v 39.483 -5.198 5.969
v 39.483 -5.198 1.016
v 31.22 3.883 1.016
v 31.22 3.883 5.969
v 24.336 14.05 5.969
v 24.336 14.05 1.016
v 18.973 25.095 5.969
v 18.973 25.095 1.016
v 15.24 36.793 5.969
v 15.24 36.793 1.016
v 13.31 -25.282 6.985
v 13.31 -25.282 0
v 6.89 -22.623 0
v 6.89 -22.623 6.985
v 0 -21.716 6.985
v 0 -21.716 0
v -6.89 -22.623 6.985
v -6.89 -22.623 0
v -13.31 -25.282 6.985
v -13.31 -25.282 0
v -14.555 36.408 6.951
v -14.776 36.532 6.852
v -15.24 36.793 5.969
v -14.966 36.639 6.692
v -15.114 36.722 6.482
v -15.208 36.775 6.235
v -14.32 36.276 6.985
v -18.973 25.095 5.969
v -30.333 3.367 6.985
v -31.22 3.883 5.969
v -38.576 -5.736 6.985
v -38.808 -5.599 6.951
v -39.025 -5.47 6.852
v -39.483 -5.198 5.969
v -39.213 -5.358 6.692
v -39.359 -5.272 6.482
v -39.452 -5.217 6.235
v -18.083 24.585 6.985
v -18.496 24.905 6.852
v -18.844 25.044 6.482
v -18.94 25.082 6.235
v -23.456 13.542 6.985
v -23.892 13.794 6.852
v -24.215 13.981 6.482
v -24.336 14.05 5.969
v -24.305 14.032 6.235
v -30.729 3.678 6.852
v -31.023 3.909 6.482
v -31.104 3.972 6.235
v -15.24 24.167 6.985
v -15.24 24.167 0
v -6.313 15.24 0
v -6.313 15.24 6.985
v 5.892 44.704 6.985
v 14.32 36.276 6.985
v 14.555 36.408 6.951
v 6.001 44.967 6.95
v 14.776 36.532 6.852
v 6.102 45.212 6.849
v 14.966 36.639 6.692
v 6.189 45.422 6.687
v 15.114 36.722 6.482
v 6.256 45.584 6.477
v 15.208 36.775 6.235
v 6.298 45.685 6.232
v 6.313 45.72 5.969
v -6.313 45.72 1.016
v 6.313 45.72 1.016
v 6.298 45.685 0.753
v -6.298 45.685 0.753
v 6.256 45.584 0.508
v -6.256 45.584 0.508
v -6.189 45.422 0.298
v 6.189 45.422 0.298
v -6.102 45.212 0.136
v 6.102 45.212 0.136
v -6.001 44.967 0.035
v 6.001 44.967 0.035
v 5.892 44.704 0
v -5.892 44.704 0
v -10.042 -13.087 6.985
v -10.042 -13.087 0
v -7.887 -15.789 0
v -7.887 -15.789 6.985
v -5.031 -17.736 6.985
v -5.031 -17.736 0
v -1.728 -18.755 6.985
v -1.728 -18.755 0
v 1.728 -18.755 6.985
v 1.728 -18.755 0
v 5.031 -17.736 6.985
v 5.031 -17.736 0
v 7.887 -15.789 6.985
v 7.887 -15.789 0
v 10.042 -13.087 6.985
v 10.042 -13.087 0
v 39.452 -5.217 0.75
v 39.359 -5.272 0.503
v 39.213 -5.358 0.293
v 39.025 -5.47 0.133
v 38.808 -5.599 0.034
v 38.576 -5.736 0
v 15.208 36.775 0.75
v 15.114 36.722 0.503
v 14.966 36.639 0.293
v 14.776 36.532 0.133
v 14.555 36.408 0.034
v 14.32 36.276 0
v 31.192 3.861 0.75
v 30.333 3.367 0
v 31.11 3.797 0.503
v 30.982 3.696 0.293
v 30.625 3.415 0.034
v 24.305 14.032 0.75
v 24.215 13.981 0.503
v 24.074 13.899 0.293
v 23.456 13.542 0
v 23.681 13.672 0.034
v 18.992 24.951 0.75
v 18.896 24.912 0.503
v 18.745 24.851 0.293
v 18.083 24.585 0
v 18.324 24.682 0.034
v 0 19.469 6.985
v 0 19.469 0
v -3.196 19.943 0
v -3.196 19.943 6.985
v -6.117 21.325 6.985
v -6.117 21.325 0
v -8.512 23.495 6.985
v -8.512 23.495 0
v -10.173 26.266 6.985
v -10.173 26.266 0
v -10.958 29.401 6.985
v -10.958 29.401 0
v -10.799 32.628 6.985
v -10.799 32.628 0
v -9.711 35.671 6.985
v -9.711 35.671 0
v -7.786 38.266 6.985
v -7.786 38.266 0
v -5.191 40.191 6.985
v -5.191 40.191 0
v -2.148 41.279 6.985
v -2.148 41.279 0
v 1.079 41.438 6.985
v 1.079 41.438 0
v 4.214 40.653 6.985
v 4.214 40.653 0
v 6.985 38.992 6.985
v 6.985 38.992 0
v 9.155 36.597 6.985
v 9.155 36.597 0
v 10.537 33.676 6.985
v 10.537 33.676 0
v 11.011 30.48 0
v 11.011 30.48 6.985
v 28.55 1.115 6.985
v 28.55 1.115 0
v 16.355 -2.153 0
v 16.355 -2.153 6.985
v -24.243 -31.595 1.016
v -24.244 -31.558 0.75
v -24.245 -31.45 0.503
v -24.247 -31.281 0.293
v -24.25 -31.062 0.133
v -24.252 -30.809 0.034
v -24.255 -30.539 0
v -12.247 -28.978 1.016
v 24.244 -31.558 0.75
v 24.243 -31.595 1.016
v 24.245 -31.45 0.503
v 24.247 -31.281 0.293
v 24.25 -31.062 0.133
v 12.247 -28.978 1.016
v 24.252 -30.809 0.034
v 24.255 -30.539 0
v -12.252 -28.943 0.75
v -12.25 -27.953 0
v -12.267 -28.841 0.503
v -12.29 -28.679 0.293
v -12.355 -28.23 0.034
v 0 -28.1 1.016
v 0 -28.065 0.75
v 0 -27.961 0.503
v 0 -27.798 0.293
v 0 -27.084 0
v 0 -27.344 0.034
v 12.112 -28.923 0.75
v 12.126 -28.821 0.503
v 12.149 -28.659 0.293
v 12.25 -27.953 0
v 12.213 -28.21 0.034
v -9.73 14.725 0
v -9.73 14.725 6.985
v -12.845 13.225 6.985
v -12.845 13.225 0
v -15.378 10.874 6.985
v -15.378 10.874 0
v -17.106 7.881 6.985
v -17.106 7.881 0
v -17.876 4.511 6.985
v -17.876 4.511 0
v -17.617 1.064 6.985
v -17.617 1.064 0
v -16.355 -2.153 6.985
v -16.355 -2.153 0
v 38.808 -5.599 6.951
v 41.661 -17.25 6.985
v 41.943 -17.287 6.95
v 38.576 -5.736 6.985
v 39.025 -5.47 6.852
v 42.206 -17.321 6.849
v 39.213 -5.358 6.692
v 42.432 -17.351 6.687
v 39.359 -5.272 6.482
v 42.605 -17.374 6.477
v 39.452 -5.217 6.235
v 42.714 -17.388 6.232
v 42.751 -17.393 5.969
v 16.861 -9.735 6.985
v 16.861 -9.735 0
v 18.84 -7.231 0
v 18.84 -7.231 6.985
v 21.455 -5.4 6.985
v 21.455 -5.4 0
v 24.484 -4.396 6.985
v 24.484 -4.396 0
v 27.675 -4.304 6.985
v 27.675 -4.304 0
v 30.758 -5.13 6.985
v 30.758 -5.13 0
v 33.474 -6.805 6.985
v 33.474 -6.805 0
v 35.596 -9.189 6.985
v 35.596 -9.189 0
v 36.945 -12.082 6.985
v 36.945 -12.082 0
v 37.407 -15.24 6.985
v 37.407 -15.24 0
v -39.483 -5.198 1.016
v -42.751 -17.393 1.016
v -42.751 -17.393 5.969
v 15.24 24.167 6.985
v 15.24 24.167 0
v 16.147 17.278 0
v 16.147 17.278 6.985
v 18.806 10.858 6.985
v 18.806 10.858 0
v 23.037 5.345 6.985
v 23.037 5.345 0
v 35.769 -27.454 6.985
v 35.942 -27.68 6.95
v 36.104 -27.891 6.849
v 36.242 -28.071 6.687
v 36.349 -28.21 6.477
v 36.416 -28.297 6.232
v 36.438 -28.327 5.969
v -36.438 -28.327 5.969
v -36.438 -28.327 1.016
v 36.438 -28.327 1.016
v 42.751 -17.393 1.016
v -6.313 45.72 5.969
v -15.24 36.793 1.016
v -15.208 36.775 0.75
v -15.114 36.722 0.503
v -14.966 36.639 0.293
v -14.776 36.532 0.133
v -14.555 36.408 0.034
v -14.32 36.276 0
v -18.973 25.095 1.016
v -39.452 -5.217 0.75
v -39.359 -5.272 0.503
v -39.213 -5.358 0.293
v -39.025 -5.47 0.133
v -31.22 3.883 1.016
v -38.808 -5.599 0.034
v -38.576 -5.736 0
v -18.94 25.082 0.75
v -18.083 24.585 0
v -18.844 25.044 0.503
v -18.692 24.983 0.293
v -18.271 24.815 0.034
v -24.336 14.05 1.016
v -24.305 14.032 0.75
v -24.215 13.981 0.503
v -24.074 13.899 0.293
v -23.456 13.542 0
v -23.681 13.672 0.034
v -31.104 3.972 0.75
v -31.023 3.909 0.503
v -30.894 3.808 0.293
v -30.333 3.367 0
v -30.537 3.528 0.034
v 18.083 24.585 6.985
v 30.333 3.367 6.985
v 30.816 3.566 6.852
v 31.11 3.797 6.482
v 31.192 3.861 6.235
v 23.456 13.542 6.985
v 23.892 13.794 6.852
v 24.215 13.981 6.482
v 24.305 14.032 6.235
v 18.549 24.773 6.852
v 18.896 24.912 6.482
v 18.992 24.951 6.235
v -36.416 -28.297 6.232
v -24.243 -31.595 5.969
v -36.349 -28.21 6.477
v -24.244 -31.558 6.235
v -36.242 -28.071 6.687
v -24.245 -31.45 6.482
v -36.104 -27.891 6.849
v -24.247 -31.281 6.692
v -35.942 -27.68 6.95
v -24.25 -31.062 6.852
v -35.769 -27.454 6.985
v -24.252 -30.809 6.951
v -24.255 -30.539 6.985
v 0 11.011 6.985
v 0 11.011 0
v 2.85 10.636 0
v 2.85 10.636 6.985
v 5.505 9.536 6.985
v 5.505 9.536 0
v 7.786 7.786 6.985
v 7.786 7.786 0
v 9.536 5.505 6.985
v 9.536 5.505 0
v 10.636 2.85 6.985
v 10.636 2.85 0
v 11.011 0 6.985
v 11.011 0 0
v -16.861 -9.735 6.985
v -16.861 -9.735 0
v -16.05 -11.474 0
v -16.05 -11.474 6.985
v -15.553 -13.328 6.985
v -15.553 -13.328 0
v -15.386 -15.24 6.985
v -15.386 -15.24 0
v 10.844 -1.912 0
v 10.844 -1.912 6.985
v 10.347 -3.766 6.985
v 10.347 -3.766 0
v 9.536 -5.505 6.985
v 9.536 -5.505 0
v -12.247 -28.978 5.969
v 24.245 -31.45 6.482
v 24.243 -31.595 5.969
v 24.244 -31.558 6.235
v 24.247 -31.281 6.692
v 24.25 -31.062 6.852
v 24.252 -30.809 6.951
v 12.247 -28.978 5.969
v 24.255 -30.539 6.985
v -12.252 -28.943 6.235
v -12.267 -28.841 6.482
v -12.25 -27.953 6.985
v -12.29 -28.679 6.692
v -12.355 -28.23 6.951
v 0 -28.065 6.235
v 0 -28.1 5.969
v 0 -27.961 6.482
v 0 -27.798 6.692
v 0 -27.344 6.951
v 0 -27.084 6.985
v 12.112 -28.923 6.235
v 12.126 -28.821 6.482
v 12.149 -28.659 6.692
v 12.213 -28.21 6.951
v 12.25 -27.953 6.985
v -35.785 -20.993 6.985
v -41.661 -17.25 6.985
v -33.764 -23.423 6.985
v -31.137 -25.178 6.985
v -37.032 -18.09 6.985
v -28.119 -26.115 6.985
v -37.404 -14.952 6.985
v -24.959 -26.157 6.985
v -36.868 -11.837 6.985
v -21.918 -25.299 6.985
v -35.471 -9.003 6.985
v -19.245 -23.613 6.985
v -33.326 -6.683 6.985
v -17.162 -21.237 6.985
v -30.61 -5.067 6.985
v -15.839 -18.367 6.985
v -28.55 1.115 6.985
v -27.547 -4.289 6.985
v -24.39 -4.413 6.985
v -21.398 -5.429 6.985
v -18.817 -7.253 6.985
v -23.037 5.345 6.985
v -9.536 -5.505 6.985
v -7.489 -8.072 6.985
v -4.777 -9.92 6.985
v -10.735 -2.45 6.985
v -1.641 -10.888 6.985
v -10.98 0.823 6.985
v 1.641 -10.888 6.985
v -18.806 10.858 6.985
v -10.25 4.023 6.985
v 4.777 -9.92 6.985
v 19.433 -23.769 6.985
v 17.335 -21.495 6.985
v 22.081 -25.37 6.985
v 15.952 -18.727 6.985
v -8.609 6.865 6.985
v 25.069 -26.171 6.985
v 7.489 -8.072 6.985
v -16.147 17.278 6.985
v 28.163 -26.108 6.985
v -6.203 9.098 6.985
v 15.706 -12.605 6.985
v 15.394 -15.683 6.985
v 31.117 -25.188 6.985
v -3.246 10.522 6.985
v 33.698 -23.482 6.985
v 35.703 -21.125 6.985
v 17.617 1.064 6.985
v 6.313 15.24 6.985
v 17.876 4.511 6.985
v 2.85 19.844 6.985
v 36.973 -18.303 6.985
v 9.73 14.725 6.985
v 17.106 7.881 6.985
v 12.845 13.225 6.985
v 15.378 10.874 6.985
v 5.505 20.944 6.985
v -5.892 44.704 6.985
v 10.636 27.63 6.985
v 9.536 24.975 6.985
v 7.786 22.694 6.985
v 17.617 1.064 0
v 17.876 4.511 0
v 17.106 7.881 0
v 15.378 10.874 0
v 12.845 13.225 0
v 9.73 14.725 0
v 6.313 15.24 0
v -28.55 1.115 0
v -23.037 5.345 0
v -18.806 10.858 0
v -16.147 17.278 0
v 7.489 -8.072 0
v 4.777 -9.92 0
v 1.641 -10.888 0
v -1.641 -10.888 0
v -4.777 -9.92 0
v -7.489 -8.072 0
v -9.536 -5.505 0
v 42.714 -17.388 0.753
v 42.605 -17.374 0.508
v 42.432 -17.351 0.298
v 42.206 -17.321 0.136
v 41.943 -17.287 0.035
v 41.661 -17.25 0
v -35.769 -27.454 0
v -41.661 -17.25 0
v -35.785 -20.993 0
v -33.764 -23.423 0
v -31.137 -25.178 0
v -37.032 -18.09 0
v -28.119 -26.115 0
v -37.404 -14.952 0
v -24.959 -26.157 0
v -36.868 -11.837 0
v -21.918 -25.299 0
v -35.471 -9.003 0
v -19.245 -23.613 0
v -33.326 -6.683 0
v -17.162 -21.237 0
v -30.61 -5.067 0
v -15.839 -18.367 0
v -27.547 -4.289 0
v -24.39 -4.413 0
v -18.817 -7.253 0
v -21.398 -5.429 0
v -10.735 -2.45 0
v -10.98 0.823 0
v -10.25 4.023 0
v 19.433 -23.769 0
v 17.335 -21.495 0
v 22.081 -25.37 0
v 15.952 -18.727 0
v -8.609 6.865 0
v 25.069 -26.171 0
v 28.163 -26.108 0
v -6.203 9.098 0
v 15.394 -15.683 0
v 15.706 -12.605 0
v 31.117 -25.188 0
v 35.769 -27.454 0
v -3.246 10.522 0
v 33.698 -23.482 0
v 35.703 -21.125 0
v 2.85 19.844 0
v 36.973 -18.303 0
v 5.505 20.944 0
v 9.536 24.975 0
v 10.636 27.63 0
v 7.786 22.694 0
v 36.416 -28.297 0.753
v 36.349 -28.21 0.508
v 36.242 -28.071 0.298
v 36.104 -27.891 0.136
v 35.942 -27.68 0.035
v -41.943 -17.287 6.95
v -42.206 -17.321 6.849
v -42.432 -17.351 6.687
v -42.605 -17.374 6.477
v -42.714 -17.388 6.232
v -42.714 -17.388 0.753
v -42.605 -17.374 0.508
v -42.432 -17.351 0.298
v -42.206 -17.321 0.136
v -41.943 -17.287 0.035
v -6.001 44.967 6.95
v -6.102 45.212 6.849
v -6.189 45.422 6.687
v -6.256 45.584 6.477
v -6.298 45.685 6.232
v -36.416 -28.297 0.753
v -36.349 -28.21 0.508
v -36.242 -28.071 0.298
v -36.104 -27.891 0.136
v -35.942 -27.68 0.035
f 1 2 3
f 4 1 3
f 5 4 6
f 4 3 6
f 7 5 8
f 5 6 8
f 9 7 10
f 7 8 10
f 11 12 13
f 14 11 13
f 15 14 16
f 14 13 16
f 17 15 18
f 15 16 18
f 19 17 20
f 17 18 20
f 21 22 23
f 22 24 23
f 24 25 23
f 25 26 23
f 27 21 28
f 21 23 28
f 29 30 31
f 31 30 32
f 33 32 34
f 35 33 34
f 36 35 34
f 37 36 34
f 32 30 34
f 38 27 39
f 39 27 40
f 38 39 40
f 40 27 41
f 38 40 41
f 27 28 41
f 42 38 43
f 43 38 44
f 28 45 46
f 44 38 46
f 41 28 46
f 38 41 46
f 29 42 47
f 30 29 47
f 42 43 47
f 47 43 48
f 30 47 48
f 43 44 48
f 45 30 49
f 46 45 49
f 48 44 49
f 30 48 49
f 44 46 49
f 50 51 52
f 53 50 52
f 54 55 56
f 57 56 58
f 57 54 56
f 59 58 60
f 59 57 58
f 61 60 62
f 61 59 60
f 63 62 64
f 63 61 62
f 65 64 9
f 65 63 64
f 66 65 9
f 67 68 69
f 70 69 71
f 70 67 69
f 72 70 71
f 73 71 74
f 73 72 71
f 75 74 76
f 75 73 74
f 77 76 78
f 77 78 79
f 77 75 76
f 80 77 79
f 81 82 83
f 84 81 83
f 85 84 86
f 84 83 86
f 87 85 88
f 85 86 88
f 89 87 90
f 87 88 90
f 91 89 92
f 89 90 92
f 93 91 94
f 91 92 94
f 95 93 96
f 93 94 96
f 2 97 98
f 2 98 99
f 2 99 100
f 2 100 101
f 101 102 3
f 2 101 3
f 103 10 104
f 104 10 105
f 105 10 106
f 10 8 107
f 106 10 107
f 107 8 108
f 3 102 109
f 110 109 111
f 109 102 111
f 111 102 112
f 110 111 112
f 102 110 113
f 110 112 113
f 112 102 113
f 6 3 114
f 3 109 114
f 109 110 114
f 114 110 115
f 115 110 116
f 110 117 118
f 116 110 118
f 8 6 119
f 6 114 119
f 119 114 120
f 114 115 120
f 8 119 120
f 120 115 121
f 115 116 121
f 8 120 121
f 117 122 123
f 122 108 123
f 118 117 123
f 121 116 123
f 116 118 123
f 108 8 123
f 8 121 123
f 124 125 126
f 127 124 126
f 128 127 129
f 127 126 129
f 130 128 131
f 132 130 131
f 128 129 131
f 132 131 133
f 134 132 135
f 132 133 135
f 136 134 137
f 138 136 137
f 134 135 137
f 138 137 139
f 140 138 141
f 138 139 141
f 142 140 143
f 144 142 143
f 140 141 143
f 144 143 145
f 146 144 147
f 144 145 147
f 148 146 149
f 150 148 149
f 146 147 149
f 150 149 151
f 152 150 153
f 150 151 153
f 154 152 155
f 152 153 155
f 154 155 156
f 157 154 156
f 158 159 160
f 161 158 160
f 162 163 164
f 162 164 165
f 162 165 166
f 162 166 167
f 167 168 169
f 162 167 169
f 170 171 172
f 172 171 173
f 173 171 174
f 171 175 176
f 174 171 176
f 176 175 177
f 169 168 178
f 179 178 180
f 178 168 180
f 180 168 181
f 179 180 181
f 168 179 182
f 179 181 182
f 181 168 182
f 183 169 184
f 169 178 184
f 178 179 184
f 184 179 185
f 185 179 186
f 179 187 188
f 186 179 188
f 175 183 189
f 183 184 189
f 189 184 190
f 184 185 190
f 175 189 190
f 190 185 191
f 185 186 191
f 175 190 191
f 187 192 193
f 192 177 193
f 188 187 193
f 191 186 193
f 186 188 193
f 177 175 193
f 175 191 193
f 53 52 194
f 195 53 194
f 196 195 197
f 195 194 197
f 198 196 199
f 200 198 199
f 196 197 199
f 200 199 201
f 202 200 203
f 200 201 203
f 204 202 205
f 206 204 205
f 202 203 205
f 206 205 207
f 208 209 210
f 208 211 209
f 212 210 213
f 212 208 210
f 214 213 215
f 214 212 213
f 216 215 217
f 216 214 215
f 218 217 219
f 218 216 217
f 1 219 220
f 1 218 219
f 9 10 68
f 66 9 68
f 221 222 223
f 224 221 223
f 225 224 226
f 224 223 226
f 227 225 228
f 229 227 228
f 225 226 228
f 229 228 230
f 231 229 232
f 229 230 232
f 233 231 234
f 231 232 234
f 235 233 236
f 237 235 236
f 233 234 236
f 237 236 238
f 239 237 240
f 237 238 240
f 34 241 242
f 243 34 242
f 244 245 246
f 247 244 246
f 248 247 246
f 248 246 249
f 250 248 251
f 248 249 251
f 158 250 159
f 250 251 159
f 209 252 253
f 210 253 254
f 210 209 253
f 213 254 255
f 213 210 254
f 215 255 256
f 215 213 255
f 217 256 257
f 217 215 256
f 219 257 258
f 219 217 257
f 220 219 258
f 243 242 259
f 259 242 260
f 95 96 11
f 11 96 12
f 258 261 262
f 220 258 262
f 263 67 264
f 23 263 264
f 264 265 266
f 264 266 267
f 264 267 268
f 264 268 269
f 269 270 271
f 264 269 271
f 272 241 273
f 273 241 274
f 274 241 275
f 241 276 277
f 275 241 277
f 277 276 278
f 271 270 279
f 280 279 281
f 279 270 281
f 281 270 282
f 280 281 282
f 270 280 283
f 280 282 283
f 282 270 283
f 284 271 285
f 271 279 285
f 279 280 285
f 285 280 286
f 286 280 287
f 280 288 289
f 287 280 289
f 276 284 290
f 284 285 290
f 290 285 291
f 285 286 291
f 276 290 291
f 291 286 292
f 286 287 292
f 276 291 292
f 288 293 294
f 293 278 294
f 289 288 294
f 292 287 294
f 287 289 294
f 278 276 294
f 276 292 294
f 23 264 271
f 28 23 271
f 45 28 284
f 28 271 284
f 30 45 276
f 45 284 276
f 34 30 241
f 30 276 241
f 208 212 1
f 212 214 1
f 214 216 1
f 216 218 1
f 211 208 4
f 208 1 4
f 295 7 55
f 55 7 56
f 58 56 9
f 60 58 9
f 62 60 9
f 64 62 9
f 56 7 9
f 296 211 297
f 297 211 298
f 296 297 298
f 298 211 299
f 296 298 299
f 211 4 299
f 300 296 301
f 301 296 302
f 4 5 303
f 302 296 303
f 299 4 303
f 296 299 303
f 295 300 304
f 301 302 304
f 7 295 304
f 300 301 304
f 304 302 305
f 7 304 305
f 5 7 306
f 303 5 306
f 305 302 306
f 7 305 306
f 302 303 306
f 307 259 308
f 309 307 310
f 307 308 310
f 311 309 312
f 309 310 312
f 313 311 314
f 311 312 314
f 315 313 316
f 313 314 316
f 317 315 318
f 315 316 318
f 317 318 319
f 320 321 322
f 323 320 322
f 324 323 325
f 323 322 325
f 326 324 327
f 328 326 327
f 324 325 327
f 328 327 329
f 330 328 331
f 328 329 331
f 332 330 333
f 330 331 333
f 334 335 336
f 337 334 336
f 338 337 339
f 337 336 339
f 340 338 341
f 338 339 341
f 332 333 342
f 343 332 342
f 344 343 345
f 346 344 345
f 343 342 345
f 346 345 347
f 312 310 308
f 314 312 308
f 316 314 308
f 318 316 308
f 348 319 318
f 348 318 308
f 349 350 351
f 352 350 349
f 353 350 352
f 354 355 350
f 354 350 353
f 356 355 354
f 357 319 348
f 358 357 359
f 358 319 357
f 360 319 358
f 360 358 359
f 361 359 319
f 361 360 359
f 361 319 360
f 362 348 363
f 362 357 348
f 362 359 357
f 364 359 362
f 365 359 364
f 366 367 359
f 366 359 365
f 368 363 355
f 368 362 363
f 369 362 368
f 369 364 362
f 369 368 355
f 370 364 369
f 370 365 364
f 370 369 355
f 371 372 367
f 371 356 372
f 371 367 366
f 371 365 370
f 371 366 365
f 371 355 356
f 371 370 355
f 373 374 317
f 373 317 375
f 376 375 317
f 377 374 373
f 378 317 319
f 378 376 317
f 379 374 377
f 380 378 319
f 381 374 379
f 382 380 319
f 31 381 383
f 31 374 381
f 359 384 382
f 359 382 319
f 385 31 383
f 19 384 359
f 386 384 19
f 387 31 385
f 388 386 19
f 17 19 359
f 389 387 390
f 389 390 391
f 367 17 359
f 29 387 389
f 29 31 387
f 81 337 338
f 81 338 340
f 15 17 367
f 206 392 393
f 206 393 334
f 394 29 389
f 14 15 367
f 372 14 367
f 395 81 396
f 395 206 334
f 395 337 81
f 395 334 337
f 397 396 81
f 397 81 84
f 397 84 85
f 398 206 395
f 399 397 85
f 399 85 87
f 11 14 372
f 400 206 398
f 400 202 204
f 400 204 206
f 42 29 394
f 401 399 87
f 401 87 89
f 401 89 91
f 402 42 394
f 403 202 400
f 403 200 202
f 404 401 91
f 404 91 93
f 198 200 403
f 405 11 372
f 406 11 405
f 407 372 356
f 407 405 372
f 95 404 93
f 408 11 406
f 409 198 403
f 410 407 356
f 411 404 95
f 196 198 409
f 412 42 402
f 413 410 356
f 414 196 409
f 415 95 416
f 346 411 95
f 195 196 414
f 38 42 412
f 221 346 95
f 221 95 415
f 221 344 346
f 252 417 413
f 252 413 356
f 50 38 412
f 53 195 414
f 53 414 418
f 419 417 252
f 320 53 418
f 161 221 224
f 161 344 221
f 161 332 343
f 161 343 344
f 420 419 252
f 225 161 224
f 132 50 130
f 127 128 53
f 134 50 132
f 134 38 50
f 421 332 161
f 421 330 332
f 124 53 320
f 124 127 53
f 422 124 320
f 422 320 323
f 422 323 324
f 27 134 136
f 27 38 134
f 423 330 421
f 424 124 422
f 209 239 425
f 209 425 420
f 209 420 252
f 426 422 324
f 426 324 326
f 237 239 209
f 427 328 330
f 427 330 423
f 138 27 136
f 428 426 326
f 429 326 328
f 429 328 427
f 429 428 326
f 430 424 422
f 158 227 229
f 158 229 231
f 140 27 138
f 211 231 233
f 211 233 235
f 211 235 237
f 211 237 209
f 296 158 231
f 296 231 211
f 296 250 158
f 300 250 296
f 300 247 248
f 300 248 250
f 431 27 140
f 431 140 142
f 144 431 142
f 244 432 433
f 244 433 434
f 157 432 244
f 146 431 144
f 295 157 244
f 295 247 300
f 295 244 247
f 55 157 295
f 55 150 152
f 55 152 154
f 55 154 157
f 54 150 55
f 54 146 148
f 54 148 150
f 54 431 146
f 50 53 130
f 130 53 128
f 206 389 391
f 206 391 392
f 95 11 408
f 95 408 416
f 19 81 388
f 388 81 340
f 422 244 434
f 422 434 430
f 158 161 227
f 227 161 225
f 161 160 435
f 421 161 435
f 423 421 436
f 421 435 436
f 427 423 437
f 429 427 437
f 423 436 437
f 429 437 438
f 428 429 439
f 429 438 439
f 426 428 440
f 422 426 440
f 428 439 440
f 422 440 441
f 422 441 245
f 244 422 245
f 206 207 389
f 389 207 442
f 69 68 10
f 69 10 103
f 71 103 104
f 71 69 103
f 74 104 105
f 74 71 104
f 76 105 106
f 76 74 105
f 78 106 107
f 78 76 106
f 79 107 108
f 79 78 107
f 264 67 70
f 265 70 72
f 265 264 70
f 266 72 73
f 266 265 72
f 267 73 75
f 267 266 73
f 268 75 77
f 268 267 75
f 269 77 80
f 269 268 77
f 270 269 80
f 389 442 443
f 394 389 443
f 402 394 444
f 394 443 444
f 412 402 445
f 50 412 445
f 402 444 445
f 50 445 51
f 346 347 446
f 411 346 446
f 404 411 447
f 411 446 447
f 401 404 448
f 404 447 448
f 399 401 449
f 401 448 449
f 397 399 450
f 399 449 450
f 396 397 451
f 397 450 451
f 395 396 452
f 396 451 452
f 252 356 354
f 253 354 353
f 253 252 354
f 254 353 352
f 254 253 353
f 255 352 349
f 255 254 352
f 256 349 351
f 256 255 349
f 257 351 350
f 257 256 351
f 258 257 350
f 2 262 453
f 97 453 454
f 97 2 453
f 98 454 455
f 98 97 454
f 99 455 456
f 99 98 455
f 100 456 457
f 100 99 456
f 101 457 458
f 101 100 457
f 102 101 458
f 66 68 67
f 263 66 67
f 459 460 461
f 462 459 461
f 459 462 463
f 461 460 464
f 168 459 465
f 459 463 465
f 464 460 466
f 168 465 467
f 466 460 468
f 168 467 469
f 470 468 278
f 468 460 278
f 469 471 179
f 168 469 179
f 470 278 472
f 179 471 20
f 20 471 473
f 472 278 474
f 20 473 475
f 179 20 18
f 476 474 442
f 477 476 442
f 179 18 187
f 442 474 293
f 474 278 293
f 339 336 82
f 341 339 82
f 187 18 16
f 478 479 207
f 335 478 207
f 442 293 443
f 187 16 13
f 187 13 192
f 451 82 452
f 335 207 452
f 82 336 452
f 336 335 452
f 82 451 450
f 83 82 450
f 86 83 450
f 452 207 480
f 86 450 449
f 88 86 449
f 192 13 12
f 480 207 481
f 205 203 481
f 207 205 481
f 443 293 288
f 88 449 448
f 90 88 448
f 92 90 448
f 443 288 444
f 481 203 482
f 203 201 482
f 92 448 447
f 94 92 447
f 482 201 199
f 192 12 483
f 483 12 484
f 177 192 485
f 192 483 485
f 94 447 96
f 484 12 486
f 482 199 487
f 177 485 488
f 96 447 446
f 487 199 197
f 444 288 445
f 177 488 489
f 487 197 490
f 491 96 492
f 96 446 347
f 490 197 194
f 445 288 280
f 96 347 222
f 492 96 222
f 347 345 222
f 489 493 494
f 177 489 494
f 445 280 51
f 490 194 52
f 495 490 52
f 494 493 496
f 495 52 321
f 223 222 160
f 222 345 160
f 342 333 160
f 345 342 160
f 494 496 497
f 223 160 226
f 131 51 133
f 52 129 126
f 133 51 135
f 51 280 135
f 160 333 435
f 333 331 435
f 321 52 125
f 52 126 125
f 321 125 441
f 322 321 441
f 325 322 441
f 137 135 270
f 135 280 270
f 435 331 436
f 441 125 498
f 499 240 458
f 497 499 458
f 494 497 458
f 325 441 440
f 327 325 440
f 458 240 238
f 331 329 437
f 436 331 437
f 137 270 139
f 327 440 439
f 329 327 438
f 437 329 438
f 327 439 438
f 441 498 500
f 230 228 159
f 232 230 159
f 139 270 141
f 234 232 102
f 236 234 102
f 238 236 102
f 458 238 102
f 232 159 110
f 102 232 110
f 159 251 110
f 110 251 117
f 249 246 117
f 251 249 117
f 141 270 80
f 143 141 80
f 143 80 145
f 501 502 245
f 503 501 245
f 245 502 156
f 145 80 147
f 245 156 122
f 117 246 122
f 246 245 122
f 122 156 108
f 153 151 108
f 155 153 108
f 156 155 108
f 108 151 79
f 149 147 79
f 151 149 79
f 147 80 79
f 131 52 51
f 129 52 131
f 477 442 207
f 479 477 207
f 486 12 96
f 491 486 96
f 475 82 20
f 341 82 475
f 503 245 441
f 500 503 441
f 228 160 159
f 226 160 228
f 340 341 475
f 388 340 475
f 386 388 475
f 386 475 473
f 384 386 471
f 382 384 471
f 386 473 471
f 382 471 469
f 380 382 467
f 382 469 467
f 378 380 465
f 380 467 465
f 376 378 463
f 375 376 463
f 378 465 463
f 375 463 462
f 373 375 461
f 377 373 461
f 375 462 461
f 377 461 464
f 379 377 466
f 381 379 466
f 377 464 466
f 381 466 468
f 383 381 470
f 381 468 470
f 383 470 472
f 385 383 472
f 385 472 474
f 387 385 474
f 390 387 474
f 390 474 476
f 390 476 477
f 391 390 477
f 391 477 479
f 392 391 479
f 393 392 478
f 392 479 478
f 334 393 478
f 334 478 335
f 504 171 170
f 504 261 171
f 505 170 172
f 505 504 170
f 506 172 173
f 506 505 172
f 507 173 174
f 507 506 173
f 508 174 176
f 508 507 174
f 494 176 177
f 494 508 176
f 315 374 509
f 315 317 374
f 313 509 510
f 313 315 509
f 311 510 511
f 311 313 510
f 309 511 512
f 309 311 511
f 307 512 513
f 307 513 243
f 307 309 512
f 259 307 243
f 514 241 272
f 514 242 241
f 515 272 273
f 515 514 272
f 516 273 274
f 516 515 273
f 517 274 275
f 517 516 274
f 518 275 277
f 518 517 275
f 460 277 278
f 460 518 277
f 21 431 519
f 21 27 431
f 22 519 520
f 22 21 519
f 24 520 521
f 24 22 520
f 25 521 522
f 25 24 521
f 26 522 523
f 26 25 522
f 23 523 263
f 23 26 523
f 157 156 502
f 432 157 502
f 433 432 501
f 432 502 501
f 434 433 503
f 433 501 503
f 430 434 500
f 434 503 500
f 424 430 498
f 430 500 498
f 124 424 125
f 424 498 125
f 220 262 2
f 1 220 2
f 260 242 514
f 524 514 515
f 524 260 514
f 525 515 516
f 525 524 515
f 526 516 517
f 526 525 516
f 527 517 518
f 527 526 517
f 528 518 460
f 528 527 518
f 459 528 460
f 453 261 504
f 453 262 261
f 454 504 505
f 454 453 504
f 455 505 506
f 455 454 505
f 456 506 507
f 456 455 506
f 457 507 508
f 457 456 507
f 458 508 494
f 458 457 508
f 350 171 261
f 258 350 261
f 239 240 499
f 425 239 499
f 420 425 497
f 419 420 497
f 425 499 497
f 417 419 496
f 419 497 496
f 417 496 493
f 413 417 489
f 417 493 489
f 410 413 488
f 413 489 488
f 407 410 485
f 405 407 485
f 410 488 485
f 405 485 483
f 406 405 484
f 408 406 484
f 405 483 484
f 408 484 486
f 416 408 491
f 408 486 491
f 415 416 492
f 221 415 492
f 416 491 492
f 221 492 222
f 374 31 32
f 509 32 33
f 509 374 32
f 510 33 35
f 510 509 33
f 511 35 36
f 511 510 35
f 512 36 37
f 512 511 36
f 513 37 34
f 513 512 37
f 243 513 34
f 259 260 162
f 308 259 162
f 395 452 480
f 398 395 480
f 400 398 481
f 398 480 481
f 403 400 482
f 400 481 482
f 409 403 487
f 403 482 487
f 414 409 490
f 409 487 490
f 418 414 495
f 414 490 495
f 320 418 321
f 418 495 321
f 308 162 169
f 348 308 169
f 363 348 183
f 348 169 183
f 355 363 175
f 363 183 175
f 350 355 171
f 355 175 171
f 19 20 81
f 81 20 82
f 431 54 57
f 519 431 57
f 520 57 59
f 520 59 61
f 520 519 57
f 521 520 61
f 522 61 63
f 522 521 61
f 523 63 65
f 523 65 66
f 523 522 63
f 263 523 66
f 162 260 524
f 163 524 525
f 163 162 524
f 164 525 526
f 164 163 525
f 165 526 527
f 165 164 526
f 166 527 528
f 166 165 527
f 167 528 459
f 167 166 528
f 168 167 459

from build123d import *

# Parameters (mm, degrees)
F1_DEPTH = 6.985
F2_R     = 1.016


with BuildPart() as f1:
    # F0 (on Top) → F1 (new body)
    with BuildSketch(Plane.XY):
        with BuildLine():
            ThreePointArc((-28.549569621, 1.114534499), (-18.8062884316, 10.8578156884), (-15.24, 24.1673853094))
            Line((-15.24, 24.1673853094), (-15.24, 36.7926146906))
            ThreePointArc((-15.24, 36.7926146906), (-24.3357044661, 14.0502255244), (-39.4833389937, -5.1980801916))
            Line((-39.4833389937, -5.1980801916), (-28.549569621, 1.114534499))
        make_face()
        with BuildLine():
            Line((15.24, 36.7926146906), (15.24, 24.1673853094))
            ThreePointArc((15.24, 24.1673853094), (18.8062884316, 10.8578156884), (28.549569621, 1.114534499))
            Line((28.549569621, 1.114534499), (39.4833389937, -5.1980801916))
            ThreePointArc((39.4833389937, -5.1980801916), (24.3357044661, 14.0502255244), (15.24, 36.7926146906))
        make_face()
        with BuildLine():
            Line((24.2433389937, -31.594534499), (13.309569621, -25.2819198084))
            ThreePointArc((13.309569621, -25.2819198084), (0, -21.7156313768), (-13.309569621, -25.2819198084))
            Line((-13.309569621, -25.2819198084), (-24.2433389937, -31.594534499))
            ThreePointArc((-24.2433389937, -31.594534499), (0, -28.1004510488), (24.2433389937, -31.594534499))
        make_face()
        Polygon((-6.3126146906, 15.24), (0, 15.24), (6.3126146906, 15.24), (15.24, 24.1673853094), (15.24, 36.7926146906), (6.3126146906, 45.72), (-6.3126146906, 45.72), (-15.24, 36.7926146906), (-15.24, 24.1673853094), align=None)
        with BuildLine():
            ThreePointArc((11.0109, 30.48), (7.785882057, 22.694117943), (0, 19.4691))
            ThreePointArc((0, 19.4691), (-7.785882057, 38.265882057), (11.0109, 30.48))
        make_face(mode=Mode.SUBTRACT)
        Polygon((-10.0419198084, -13.0868846863), (-13.1982271537, -7.62), (-16.354534499, -2.1531153137), (-28.549569621, 1.114534499), (-39.4833389937, -5.1980801916), (-42.7509888063, -17.3931153137), (-36.4383741157, -28.3268846863), (-24.2433389937, -31.594534499), (-13.309569621, -25.2819198084), align=None)
        with BuildLine():
            ThreePointArc((-15.3855543073, -15.24), (-37.032166988, -18.0898306237), (-16.8607351888, -9.73455))
            ThreePointArc((-16.8607351888, -9.73455), (-15.7607416267, -12.3901693763), (-15.3855543073, -15.24))
        make_face(mode=Mode.SUBTRACT)
        Polygon((16.354534499, -2.1531153137), (13.1982271537, -7.62), (10.0419198084, -13.0868846863), (13.309569621, -25.2819198084), (24.2433389937, -31.594534499), (36.4383741157, -28.3268846863), (42.7509888063, -17.3931153137), (39.4833389937, -5.1980801916), (28.549569621, 1.114534499), align=None)
        with BuildLine():
            ThreePointArc((37.4073543073, -15.24), (23.5466236836, -25.8757126807), (16.8607351888, -9.73455))
            ThreePointArc((16.8607351888, -9.73455), (29.2462849311, -4.6042873193), (37.4073543073, -15.24))
        make_face(mode=Mode.SUBTRACT)
        with BuildLine():
            ThreePointArc((-9.5357191185, -5.50545), (-9.5357191185, 5.50545), (0, 11.0109))
            Line((0, 11.0109), (0, 15.24))
            Line((0, 15.24), (-6.3126146906, 15.24))
            ThreePointArc((-6.3126146906, 15.24), (-16.354534499, 9.4422948954), (-16.354534499, -2.1531153137))
            Line((-16.354534499, -2.1531153137), (-13.1982271537, -7.62))
            Line((-13.1982271537, -7.62), (-9.5357191185, -5.50545))
        make_face()
        with BuildLine():
            ThreePointArc((0, 11.0109), (7.785882057, 7.785882057), (11.0109, 0))
            ThreePointArc((11.0109, 0), (10.6357126807, -2.8498306237), (9.5357191185, -5.50545))
            Line((9.5357191185, -5.50545), (13.1982271537, -7.62))
            Line((13.1982271537, -7.62), (16.354534499, -2.1531153137))
            ThreePointArc((16.354534499, -2.1531153137), (16.354534499, 9.4422948954), (6.3126146906, 15.24))
            Line((6.3126146906, 15.24), (0, 15.24))
            Line((0, 15.24), (0, 11.0109))
        make_face()
        with BuildLine():
            Line((13.1982271537, -7.62), (9.5357191185, -5.50545))
            ThreePointArc((9.5357191185, -5.50545), (0, -11.0109), (-9.5357191185, -5.50545))
            Line((-9.5357191185, -5.50545), (-13.1982271537, -7.62))
            Line((-13.1982271537, -7.62), (-10.0419198084, -13.0868846863))
            ThreePointArc((-10.0419198084, -13.0868846863), (0, -18.8845897909), (10.0419198084, -13.0868846863))
            Line((10.0419198084, -13.0868846863), (13.1982271537, -7.62))
        make_face()
    extrude(amount=F1_DEPTH)

    # F2#2 (call 1 of 2: OpenCascade refuses the feature's edges together)
    f2_2_edges = [f1.edges().sort_by_distance(p)[0] for p in [
        (0, -28.100451, 0),
        (-24.335704, 14.050226, 0),
        (24.335704, 14.050226, 0),
        (10.776307, 41.256307, 0),
        (0, 45.72, 0),
        (-10.776307, 41.256307, 0),
        (-30.340857, -29.96071, 0),
        (-39.594681, -22.86, 0),
        (-41.117164, -11.295598, 0),
        (30.340857, -29.96071, 0),
        (39.594681, -22.86, 0),
        (41.117164, -11.295598, 0),
    ]]
    fillet(f2_2_edges, radius=F2_R)

    # F2 (call 2 of 2)
    f2_edges = [f1.edges().sort_by_distance(p)[0] for p in [
        (0, -28.100451, 6.985),
        (-24.335704, 14.050226, 6.985),
        (24.335704, 14.050226, 6.985),
        (-10.776307, 41.256307, 6.985),
        (0, 45.72, 6.985),
        (10.776307, 41.256307, 6.985),
        (-39.594681, -22.86, 6.985),
        (-30.340857, -29.96071, 6.985),
        (-41.117164, -11.295598, 6.985),
        (30.340857, -29.96071, 6.985),
        (39.594681, -22.86, 6.985),
        (41.117164, -11.295598, 6.985),
    ]]
    fillet(f2_edges, radius=F2_R)


solid = f1.part
